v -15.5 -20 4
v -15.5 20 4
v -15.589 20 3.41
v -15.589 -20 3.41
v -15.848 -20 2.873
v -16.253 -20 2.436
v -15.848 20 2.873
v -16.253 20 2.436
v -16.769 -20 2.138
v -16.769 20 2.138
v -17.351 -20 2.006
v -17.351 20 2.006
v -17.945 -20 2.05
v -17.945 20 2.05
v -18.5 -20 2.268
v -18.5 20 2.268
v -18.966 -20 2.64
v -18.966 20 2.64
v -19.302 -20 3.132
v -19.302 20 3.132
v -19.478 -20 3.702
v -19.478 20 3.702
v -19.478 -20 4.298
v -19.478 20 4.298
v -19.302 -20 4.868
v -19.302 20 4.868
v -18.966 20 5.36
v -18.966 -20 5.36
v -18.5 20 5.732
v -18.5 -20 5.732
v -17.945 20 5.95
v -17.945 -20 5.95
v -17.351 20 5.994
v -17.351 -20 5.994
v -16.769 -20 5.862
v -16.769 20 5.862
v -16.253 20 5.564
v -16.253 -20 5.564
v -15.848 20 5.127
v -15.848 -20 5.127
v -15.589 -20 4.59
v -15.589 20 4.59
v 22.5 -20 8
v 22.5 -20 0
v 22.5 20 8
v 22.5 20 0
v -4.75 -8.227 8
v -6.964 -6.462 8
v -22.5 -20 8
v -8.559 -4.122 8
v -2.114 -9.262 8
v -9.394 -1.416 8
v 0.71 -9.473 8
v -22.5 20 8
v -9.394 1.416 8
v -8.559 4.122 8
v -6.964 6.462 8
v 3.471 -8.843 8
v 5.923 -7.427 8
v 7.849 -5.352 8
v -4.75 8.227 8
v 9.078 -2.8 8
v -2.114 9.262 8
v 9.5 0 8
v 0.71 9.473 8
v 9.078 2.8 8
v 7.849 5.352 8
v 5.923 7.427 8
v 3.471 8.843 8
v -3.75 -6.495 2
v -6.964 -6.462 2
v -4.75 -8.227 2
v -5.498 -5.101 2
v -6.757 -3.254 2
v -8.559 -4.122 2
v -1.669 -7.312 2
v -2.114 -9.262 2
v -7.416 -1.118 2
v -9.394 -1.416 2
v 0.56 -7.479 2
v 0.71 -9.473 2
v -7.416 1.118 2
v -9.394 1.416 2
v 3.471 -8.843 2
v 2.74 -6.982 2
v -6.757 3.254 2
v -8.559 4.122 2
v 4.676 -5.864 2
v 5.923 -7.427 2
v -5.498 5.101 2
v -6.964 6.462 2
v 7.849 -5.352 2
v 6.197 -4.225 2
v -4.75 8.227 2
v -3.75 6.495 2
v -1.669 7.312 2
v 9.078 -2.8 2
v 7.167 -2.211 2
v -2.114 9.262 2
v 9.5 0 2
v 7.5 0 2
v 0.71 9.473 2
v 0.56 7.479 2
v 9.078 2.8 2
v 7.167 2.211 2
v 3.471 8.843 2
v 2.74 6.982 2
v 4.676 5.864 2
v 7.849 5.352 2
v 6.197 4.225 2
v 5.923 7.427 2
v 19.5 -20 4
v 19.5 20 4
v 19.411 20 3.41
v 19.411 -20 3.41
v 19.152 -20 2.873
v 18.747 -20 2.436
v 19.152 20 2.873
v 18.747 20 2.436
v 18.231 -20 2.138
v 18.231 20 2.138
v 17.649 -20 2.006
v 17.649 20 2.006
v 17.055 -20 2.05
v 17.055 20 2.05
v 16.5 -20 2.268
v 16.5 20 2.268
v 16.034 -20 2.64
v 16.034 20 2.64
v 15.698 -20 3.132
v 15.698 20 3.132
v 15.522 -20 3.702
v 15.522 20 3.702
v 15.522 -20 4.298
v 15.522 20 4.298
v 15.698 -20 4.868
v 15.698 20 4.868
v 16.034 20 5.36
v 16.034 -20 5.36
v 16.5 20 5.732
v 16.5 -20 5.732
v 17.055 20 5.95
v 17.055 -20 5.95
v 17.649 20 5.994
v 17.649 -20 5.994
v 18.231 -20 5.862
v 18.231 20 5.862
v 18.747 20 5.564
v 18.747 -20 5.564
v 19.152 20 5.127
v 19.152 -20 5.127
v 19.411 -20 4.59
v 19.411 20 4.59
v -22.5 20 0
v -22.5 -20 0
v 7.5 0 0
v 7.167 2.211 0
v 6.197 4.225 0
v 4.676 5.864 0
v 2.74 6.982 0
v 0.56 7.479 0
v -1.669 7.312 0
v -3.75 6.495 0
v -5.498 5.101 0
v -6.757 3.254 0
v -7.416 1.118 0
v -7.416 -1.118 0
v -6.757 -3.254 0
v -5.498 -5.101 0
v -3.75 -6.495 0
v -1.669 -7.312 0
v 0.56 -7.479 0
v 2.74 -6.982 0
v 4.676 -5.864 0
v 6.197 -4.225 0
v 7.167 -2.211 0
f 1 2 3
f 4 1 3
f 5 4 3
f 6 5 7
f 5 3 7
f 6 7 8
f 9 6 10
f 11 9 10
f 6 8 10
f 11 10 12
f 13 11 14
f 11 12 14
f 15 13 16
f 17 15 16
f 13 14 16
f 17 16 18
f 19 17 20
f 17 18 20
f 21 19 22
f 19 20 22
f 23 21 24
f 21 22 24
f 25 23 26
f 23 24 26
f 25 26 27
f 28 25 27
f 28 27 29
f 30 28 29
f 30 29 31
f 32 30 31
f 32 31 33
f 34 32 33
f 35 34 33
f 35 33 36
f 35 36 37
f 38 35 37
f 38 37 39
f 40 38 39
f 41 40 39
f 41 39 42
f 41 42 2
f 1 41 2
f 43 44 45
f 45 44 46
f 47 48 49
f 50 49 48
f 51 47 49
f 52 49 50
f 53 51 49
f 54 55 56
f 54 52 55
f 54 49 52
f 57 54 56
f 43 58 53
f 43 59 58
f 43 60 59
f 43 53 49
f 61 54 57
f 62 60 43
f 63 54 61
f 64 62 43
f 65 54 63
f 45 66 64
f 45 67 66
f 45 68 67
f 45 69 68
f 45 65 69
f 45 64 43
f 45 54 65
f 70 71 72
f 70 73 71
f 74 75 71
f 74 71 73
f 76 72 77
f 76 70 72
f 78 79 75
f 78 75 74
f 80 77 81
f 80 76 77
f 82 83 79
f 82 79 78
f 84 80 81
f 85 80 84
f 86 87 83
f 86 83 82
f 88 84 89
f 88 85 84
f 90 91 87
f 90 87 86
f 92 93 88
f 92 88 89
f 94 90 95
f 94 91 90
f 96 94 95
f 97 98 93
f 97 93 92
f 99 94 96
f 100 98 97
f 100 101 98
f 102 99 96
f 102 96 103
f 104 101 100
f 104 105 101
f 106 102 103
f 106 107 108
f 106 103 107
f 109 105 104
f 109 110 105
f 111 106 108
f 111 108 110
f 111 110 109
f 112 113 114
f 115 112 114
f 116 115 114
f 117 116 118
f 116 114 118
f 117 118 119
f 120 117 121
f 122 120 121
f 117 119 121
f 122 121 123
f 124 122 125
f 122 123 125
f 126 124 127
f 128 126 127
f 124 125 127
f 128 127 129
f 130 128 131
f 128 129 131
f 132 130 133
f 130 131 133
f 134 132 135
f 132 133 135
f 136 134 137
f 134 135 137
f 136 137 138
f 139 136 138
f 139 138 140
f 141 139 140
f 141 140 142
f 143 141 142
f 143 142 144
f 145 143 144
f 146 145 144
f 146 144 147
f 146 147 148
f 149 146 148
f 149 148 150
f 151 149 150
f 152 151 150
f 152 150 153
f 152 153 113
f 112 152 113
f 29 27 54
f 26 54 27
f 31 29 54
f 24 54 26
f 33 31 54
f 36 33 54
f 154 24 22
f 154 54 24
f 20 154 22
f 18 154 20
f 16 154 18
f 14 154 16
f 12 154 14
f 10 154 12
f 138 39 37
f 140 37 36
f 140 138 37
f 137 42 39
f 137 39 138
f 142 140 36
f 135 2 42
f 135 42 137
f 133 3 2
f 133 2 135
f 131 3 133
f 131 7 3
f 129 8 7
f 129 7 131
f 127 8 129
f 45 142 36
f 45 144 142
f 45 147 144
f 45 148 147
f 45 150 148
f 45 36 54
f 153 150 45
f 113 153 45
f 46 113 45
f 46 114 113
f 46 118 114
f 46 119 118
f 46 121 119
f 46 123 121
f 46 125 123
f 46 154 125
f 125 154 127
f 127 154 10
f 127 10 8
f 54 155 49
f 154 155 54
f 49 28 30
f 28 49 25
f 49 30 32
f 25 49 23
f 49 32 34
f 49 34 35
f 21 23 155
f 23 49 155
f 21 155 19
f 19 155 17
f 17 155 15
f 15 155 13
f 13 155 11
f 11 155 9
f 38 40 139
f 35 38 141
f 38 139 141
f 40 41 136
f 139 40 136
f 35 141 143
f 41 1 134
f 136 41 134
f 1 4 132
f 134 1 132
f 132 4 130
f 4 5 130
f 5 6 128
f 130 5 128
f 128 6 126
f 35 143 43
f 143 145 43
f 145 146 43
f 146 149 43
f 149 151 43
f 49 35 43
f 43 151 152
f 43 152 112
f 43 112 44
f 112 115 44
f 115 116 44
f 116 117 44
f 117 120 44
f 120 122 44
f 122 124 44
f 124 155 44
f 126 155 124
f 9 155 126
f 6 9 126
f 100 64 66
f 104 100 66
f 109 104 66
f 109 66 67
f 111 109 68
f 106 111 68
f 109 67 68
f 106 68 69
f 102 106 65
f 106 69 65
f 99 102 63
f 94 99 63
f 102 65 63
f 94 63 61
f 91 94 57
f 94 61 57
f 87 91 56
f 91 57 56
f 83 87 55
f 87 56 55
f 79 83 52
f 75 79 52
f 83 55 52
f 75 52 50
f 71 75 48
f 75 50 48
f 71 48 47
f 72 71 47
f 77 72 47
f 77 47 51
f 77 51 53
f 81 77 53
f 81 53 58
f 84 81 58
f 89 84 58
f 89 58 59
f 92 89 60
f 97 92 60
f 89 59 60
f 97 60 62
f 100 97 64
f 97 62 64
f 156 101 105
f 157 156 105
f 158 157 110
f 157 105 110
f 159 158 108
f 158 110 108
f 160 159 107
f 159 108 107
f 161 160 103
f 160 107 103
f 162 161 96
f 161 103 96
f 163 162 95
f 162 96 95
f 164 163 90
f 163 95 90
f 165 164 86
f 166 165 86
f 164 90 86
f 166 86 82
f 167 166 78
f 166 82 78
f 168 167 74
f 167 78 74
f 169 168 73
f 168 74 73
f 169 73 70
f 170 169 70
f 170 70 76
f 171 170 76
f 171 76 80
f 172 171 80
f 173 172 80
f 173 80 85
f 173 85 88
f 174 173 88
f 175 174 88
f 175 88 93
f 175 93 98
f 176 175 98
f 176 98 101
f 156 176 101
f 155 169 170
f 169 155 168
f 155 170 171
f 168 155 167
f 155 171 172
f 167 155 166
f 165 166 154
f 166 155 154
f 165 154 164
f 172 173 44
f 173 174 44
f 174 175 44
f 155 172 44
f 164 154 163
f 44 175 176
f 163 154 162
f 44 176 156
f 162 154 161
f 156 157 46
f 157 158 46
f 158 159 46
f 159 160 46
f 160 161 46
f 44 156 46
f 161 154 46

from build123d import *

# Parameters (mm, degrees)
ESQUISSE1_W             = 45
ESQUISSE1_H             = 40
BOSS_EXTRU_1_DEPTH      = 8
ESQUISSE2_R             = 7.5
ENL_V_MAT_EXTRU_1_DEPTH = 9
ESQUISSE3_R             = 9.5
ENL_V_MAT_EXTRU_2_DEPTH = 6
ESQUISSE4_R             = 2
ENL_V_MAT_EXTRU_3_DEPTH = 41


with BuildPart() as part:
    # Esquisse1 → Boss.-Extru.1 (new body)
    with BuildSketch(Plane.XY):
        Rectangle(ESQUISSE1_W, ESQUISSE1_H)
    extrude(amount=BOSS_EXTRU_1_DEPTH)

    # Esquisse2 → Enlèv. mat.-Extru.1 (cut, through all)
    with BuildSketch(Plane.XY.offset(8)):
        Circle(ESQUISSE2_R)
    extrude(amount=-ENL_V_MAT_EXTRU_1_DEPTH, mode=Mode.SUBTRACT)

    # Esquisse3 → Enlèv. mat.-Extru.2 (cut)
    with BuildSketch(Plane.XY.offset(8)):
        Circle(ESQUISSE3_R)
    extrude(amount=-ENL_V_MAT_EXTRU_2_DEPTH, mode=Mode.SUBTRACT)

    # Esquisse4 → Enlèv. mat.-Extru.3 (cut, through all)
    with BuildSketch(Plane(origin=(0, 20, 0), x_dir=(1, 0, 0), z_dir=(0, 1, 0))):
        with Locations((-17.5, -4)):
            Circle(ESQUISSE4_R)
        with Locations((17.5, -4)):
            Circle(ESQUISSE4_R)
    extrude(amount=-ENL_V_MAT_EXTRU_3_DEPTH, mode=Mode.SUBTRACT)


solid = part.part
